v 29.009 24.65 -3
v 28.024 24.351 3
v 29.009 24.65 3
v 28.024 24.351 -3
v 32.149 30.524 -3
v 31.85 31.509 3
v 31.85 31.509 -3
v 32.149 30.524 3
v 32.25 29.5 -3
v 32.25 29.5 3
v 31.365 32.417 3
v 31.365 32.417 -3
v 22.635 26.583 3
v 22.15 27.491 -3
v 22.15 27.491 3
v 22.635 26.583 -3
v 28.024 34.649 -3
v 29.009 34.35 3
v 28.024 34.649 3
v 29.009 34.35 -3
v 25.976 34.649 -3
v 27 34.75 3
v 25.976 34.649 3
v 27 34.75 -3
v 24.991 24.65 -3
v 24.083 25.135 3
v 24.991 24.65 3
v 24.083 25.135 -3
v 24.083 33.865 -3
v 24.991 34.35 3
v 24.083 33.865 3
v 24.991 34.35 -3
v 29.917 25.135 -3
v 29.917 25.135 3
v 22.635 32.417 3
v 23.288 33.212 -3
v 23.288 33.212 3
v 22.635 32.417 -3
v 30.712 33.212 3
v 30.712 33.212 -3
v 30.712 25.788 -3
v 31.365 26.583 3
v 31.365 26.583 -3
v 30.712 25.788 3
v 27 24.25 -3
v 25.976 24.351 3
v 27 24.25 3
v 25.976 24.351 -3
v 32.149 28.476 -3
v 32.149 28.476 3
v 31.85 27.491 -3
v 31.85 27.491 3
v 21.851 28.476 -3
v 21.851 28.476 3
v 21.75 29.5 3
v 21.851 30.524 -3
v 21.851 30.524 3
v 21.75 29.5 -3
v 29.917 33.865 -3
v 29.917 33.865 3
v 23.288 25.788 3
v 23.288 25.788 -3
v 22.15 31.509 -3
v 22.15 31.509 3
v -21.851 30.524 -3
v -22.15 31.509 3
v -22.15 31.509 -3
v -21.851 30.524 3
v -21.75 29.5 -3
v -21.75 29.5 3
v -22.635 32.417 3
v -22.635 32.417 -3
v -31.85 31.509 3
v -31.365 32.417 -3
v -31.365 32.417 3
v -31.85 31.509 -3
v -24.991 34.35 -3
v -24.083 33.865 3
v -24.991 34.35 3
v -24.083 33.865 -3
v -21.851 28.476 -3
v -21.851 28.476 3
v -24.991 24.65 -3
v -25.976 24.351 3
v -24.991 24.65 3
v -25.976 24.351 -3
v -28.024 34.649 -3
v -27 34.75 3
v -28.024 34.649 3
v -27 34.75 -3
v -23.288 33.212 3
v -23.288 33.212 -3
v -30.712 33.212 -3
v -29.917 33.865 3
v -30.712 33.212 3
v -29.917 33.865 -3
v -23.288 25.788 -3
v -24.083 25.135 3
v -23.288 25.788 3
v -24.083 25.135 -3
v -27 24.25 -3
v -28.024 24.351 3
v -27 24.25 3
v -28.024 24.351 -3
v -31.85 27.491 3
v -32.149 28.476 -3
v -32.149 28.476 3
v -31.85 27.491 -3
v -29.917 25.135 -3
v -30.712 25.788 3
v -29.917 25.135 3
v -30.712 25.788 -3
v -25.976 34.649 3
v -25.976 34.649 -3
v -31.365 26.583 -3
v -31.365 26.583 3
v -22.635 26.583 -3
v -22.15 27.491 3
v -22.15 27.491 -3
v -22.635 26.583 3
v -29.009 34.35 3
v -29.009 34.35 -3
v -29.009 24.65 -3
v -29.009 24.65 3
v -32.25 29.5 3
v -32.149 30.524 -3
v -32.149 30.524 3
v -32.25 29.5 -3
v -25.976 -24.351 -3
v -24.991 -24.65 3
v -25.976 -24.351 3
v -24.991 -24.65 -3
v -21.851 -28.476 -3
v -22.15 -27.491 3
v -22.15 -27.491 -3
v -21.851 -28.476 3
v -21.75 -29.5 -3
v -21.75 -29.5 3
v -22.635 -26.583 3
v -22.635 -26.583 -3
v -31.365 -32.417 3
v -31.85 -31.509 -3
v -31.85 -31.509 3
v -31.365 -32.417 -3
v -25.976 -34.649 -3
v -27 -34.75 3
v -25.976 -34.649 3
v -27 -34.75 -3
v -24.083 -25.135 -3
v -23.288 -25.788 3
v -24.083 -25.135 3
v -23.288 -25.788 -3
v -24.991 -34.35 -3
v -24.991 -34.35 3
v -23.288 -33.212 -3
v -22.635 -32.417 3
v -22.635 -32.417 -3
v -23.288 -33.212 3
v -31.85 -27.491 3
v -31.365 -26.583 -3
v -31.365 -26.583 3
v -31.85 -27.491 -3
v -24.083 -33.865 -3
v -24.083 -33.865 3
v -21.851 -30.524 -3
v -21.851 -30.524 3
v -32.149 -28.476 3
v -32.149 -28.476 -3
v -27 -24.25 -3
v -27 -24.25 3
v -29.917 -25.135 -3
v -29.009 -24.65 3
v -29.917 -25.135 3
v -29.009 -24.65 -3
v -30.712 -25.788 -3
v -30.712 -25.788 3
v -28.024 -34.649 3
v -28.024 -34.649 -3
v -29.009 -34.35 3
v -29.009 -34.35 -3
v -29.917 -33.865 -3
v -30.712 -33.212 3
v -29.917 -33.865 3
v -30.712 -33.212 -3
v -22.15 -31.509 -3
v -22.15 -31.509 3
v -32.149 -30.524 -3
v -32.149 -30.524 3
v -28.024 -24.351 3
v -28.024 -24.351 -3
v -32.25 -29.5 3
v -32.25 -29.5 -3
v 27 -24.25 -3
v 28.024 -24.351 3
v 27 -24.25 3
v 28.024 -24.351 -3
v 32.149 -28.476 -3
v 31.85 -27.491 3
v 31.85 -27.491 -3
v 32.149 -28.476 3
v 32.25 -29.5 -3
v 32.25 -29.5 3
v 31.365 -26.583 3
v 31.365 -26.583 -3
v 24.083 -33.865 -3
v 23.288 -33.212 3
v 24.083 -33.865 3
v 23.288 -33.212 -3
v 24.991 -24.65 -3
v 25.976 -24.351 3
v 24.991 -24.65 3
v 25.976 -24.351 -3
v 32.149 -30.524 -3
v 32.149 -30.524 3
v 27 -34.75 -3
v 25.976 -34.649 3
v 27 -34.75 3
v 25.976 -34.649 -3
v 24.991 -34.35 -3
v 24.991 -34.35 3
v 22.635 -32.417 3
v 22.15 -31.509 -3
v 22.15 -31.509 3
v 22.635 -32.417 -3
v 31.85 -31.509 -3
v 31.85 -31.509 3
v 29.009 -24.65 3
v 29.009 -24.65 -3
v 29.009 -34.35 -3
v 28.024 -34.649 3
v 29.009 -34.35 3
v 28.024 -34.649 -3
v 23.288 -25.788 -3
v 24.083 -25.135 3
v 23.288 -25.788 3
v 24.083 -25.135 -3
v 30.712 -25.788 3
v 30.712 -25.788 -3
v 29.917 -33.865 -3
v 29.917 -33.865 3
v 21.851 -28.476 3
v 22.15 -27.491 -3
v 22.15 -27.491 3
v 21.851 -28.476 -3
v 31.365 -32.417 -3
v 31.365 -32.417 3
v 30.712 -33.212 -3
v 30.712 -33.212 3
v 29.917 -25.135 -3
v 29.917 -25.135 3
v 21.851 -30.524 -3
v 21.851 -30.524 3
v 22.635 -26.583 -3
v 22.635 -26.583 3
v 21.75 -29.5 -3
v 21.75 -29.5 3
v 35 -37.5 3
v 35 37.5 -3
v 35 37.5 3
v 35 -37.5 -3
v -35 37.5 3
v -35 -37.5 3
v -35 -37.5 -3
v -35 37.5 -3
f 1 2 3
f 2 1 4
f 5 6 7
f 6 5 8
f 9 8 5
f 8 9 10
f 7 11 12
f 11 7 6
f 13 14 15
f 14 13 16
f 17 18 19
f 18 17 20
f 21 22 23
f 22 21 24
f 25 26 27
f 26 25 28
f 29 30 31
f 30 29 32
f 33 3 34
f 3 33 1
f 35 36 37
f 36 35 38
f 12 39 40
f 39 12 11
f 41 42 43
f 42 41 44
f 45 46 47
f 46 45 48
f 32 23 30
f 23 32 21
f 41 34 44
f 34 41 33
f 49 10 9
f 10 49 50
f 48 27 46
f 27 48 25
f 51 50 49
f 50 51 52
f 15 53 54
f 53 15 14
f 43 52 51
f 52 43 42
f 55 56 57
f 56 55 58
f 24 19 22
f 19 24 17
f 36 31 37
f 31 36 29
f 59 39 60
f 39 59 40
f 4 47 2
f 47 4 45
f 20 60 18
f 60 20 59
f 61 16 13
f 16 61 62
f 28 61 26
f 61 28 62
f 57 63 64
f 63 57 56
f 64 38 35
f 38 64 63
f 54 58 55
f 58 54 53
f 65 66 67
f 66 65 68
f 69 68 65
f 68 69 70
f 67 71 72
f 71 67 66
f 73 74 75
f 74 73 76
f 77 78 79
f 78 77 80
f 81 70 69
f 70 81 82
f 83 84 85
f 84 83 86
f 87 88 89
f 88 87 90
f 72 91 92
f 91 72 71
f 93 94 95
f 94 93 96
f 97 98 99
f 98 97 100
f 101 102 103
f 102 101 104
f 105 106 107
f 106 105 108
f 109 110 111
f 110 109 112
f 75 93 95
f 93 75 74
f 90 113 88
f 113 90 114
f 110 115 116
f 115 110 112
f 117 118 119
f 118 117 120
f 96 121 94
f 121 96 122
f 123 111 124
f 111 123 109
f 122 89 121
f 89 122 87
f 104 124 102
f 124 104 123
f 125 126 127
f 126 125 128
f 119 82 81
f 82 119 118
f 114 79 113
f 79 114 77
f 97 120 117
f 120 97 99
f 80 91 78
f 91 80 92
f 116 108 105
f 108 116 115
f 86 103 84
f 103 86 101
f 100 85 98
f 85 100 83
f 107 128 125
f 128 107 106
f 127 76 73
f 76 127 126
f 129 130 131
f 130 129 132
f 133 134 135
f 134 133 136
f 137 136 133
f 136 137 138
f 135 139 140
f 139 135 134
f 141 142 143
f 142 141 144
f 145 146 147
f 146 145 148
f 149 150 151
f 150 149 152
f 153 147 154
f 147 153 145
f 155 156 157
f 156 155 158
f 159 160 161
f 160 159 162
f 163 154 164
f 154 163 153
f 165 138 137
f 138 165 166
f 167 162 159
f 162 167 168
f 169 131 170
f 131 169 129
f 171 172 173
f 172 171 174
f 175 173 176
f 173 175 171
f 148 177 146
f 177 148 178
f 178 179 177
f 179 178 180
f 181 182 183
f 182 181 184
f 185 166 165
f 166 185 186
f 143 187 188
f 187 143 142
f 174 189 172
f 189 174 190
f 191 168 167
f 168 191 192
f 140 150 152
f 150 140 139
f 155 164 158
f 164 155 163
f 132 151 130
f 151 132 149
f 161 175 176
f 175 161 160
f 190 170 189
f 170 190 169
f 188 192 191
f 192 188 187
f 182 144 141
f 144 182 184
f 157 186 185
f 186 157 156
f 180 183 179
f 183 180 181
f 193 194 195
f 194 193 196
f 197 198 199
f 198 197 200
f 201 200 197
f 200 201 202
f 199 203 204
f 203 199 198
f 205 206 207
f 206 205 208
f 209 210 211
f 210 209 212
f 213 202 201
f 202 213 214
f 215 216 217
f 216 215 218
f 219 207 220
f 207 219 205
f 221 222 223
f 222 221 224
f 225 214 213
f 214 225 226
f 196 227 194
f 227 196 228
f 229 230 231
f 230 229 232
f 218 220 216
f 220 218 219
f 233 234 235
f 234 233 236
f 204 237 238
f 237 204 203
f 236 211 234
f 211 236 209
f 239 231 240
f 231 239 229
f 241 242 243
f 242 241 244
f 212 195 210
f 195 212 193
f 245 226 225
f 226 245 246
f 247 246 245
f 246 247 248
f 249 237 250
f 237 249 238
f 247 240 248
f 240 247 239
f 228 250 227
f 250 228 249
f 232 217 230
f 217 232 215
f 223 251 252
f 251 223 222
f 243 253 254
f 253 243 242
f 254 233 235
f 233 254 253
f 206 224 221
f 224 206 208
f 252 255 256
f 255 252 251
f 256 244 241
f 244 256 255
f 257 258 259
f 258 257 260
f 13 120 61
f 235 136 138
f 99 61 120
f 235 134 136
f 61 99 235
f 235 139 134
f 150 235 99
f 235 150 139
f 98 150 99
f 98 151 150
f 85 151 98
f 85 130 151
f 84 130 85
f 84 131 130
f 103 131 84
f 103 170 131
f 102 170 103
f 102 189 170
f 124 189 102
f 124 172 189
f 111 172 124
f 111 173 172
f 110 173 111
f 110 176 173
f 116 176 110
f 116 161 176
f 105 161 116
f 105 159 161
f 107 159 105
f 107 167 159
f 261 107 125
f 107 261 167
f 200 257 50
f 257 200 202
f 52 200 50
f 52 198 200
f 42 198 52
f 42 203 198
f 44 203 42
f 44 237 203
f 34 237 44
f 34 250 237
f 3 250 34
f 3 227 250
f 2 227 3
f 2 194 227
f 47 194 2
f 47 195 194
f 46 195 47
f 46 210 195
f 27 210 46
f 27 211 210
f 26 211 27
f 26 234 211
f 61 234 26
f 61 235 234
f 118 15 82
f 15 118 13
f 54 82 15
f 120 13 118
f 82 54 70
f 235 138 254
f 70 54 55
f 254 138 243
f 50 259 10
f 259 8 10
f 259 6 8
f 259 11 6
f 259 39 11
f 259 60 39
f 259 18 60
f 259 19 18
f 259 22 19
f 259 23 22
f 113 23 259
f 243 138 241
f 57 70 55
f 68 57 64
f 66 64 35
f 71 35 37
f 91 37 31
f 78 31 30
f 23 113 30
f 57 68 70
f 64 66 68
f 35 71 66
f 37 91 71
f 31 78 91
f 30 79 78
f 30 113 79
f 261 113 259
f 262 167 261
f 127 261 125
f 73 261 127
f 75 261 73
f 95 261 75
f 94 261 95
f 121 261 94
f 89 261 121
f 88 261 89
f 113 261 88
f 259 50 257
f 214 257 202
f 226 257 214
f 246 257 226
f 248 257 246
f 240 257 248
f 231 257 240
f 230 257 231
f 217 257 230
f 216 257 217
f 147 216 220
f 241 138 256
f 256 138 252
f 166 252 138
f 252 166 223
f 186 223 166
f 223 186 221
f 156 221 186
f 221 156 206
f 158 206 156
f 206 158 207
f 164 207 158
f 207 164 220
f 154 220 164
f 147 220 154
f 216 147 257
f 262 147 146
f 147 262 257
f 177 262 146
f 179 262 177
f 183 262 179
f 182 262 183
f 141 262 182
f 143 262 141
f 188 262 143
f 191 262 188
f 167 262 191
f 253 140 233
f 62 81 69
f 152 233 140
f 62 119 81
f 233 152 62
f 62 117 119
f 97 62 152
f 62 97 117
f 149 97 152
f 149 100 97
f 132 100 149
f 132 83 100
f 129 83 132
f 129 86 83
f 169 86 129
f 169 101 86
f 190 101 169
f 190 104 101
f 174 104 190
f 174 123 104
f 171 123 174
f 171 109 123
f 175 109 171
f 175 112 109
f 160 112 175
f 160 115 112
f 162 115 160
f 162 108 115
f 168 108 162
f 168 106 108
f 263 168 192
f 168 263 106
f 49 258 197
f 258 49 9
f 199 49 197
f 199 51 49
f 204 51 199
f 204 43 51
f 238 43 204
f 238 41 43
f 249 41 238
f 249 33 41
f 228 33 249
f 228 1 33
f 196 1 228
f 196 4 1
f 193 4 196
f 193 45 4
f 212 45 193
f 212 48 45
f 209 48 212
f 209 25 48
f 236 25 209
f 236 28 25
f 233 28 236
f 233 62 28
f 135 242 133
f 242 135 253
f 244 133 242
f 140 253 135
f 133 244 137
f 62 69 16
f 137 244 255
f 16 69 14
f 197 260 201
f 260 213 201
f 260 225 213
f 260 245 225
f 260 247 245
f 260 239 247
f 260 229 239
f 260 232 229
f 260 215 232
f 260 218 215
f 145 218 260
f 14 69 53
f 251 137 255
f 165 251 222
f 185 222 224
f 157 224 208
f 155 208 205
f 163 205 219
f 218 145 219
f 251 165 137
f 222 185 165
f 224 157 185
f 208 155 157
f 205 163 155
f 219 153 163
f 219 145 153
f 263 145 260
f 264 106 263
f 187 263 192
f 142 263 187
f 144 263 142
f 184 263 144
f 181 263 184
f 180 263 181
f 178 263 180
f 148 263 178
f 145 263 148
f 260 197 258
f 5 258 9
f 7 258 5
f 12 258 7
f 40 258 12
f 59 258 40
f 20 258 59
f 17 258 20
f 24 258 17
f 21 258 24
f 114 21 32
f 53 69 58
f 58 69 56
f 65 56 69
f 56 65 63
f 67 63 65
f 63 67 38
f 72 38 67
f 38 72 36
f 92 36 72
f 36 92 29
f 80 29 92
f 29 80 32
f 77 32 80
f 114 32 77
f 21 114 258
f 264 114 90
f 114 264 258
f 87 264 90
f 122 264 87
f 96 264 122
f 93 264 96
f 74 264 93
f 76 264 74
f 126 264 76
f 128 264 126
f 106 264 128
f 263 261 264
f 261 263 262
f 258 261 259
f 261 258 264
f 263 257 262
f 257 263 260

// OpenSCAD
$fn = 32;

// ----------------------------------------------------------------------
// Corner plate 70 x 75 x 6
// 4 holes, centres taken from the edge offset
// ----------------------------------------------------------------------

// --- parameters (mm) ---
plate = [70, 75, 6];  // overall size (x, y, z)
holes = 4;            // number of holes the drawing asks for
hole_d = 10.5;        // hole diameter
edge = 8;             // hole centre offset from the plate edge

// --- derived feature positions (mm) ---
corner_x = plate[0] / 2 - edge;  // = 27   corner hole X
corner_y = plate[1] / 2 - edge;  // = 29.5   corner hole Y
feature_centers = [
  [corner_x, corner_y],
  [-corner_x, corner_y],
  [-corner_x, -corner_y],
  [corner_x, -corner_y]
];   // hole centres the loop below drills

// plate outline, every hole drilled through with the same cutters
difference() {
  cube(plate, center = true);
  for (centre = feature_centers)
    translate([centre[0], centre[1], 0])
      cylinder(d = hole_d, h = plate[2] + 2, center = true);
}
